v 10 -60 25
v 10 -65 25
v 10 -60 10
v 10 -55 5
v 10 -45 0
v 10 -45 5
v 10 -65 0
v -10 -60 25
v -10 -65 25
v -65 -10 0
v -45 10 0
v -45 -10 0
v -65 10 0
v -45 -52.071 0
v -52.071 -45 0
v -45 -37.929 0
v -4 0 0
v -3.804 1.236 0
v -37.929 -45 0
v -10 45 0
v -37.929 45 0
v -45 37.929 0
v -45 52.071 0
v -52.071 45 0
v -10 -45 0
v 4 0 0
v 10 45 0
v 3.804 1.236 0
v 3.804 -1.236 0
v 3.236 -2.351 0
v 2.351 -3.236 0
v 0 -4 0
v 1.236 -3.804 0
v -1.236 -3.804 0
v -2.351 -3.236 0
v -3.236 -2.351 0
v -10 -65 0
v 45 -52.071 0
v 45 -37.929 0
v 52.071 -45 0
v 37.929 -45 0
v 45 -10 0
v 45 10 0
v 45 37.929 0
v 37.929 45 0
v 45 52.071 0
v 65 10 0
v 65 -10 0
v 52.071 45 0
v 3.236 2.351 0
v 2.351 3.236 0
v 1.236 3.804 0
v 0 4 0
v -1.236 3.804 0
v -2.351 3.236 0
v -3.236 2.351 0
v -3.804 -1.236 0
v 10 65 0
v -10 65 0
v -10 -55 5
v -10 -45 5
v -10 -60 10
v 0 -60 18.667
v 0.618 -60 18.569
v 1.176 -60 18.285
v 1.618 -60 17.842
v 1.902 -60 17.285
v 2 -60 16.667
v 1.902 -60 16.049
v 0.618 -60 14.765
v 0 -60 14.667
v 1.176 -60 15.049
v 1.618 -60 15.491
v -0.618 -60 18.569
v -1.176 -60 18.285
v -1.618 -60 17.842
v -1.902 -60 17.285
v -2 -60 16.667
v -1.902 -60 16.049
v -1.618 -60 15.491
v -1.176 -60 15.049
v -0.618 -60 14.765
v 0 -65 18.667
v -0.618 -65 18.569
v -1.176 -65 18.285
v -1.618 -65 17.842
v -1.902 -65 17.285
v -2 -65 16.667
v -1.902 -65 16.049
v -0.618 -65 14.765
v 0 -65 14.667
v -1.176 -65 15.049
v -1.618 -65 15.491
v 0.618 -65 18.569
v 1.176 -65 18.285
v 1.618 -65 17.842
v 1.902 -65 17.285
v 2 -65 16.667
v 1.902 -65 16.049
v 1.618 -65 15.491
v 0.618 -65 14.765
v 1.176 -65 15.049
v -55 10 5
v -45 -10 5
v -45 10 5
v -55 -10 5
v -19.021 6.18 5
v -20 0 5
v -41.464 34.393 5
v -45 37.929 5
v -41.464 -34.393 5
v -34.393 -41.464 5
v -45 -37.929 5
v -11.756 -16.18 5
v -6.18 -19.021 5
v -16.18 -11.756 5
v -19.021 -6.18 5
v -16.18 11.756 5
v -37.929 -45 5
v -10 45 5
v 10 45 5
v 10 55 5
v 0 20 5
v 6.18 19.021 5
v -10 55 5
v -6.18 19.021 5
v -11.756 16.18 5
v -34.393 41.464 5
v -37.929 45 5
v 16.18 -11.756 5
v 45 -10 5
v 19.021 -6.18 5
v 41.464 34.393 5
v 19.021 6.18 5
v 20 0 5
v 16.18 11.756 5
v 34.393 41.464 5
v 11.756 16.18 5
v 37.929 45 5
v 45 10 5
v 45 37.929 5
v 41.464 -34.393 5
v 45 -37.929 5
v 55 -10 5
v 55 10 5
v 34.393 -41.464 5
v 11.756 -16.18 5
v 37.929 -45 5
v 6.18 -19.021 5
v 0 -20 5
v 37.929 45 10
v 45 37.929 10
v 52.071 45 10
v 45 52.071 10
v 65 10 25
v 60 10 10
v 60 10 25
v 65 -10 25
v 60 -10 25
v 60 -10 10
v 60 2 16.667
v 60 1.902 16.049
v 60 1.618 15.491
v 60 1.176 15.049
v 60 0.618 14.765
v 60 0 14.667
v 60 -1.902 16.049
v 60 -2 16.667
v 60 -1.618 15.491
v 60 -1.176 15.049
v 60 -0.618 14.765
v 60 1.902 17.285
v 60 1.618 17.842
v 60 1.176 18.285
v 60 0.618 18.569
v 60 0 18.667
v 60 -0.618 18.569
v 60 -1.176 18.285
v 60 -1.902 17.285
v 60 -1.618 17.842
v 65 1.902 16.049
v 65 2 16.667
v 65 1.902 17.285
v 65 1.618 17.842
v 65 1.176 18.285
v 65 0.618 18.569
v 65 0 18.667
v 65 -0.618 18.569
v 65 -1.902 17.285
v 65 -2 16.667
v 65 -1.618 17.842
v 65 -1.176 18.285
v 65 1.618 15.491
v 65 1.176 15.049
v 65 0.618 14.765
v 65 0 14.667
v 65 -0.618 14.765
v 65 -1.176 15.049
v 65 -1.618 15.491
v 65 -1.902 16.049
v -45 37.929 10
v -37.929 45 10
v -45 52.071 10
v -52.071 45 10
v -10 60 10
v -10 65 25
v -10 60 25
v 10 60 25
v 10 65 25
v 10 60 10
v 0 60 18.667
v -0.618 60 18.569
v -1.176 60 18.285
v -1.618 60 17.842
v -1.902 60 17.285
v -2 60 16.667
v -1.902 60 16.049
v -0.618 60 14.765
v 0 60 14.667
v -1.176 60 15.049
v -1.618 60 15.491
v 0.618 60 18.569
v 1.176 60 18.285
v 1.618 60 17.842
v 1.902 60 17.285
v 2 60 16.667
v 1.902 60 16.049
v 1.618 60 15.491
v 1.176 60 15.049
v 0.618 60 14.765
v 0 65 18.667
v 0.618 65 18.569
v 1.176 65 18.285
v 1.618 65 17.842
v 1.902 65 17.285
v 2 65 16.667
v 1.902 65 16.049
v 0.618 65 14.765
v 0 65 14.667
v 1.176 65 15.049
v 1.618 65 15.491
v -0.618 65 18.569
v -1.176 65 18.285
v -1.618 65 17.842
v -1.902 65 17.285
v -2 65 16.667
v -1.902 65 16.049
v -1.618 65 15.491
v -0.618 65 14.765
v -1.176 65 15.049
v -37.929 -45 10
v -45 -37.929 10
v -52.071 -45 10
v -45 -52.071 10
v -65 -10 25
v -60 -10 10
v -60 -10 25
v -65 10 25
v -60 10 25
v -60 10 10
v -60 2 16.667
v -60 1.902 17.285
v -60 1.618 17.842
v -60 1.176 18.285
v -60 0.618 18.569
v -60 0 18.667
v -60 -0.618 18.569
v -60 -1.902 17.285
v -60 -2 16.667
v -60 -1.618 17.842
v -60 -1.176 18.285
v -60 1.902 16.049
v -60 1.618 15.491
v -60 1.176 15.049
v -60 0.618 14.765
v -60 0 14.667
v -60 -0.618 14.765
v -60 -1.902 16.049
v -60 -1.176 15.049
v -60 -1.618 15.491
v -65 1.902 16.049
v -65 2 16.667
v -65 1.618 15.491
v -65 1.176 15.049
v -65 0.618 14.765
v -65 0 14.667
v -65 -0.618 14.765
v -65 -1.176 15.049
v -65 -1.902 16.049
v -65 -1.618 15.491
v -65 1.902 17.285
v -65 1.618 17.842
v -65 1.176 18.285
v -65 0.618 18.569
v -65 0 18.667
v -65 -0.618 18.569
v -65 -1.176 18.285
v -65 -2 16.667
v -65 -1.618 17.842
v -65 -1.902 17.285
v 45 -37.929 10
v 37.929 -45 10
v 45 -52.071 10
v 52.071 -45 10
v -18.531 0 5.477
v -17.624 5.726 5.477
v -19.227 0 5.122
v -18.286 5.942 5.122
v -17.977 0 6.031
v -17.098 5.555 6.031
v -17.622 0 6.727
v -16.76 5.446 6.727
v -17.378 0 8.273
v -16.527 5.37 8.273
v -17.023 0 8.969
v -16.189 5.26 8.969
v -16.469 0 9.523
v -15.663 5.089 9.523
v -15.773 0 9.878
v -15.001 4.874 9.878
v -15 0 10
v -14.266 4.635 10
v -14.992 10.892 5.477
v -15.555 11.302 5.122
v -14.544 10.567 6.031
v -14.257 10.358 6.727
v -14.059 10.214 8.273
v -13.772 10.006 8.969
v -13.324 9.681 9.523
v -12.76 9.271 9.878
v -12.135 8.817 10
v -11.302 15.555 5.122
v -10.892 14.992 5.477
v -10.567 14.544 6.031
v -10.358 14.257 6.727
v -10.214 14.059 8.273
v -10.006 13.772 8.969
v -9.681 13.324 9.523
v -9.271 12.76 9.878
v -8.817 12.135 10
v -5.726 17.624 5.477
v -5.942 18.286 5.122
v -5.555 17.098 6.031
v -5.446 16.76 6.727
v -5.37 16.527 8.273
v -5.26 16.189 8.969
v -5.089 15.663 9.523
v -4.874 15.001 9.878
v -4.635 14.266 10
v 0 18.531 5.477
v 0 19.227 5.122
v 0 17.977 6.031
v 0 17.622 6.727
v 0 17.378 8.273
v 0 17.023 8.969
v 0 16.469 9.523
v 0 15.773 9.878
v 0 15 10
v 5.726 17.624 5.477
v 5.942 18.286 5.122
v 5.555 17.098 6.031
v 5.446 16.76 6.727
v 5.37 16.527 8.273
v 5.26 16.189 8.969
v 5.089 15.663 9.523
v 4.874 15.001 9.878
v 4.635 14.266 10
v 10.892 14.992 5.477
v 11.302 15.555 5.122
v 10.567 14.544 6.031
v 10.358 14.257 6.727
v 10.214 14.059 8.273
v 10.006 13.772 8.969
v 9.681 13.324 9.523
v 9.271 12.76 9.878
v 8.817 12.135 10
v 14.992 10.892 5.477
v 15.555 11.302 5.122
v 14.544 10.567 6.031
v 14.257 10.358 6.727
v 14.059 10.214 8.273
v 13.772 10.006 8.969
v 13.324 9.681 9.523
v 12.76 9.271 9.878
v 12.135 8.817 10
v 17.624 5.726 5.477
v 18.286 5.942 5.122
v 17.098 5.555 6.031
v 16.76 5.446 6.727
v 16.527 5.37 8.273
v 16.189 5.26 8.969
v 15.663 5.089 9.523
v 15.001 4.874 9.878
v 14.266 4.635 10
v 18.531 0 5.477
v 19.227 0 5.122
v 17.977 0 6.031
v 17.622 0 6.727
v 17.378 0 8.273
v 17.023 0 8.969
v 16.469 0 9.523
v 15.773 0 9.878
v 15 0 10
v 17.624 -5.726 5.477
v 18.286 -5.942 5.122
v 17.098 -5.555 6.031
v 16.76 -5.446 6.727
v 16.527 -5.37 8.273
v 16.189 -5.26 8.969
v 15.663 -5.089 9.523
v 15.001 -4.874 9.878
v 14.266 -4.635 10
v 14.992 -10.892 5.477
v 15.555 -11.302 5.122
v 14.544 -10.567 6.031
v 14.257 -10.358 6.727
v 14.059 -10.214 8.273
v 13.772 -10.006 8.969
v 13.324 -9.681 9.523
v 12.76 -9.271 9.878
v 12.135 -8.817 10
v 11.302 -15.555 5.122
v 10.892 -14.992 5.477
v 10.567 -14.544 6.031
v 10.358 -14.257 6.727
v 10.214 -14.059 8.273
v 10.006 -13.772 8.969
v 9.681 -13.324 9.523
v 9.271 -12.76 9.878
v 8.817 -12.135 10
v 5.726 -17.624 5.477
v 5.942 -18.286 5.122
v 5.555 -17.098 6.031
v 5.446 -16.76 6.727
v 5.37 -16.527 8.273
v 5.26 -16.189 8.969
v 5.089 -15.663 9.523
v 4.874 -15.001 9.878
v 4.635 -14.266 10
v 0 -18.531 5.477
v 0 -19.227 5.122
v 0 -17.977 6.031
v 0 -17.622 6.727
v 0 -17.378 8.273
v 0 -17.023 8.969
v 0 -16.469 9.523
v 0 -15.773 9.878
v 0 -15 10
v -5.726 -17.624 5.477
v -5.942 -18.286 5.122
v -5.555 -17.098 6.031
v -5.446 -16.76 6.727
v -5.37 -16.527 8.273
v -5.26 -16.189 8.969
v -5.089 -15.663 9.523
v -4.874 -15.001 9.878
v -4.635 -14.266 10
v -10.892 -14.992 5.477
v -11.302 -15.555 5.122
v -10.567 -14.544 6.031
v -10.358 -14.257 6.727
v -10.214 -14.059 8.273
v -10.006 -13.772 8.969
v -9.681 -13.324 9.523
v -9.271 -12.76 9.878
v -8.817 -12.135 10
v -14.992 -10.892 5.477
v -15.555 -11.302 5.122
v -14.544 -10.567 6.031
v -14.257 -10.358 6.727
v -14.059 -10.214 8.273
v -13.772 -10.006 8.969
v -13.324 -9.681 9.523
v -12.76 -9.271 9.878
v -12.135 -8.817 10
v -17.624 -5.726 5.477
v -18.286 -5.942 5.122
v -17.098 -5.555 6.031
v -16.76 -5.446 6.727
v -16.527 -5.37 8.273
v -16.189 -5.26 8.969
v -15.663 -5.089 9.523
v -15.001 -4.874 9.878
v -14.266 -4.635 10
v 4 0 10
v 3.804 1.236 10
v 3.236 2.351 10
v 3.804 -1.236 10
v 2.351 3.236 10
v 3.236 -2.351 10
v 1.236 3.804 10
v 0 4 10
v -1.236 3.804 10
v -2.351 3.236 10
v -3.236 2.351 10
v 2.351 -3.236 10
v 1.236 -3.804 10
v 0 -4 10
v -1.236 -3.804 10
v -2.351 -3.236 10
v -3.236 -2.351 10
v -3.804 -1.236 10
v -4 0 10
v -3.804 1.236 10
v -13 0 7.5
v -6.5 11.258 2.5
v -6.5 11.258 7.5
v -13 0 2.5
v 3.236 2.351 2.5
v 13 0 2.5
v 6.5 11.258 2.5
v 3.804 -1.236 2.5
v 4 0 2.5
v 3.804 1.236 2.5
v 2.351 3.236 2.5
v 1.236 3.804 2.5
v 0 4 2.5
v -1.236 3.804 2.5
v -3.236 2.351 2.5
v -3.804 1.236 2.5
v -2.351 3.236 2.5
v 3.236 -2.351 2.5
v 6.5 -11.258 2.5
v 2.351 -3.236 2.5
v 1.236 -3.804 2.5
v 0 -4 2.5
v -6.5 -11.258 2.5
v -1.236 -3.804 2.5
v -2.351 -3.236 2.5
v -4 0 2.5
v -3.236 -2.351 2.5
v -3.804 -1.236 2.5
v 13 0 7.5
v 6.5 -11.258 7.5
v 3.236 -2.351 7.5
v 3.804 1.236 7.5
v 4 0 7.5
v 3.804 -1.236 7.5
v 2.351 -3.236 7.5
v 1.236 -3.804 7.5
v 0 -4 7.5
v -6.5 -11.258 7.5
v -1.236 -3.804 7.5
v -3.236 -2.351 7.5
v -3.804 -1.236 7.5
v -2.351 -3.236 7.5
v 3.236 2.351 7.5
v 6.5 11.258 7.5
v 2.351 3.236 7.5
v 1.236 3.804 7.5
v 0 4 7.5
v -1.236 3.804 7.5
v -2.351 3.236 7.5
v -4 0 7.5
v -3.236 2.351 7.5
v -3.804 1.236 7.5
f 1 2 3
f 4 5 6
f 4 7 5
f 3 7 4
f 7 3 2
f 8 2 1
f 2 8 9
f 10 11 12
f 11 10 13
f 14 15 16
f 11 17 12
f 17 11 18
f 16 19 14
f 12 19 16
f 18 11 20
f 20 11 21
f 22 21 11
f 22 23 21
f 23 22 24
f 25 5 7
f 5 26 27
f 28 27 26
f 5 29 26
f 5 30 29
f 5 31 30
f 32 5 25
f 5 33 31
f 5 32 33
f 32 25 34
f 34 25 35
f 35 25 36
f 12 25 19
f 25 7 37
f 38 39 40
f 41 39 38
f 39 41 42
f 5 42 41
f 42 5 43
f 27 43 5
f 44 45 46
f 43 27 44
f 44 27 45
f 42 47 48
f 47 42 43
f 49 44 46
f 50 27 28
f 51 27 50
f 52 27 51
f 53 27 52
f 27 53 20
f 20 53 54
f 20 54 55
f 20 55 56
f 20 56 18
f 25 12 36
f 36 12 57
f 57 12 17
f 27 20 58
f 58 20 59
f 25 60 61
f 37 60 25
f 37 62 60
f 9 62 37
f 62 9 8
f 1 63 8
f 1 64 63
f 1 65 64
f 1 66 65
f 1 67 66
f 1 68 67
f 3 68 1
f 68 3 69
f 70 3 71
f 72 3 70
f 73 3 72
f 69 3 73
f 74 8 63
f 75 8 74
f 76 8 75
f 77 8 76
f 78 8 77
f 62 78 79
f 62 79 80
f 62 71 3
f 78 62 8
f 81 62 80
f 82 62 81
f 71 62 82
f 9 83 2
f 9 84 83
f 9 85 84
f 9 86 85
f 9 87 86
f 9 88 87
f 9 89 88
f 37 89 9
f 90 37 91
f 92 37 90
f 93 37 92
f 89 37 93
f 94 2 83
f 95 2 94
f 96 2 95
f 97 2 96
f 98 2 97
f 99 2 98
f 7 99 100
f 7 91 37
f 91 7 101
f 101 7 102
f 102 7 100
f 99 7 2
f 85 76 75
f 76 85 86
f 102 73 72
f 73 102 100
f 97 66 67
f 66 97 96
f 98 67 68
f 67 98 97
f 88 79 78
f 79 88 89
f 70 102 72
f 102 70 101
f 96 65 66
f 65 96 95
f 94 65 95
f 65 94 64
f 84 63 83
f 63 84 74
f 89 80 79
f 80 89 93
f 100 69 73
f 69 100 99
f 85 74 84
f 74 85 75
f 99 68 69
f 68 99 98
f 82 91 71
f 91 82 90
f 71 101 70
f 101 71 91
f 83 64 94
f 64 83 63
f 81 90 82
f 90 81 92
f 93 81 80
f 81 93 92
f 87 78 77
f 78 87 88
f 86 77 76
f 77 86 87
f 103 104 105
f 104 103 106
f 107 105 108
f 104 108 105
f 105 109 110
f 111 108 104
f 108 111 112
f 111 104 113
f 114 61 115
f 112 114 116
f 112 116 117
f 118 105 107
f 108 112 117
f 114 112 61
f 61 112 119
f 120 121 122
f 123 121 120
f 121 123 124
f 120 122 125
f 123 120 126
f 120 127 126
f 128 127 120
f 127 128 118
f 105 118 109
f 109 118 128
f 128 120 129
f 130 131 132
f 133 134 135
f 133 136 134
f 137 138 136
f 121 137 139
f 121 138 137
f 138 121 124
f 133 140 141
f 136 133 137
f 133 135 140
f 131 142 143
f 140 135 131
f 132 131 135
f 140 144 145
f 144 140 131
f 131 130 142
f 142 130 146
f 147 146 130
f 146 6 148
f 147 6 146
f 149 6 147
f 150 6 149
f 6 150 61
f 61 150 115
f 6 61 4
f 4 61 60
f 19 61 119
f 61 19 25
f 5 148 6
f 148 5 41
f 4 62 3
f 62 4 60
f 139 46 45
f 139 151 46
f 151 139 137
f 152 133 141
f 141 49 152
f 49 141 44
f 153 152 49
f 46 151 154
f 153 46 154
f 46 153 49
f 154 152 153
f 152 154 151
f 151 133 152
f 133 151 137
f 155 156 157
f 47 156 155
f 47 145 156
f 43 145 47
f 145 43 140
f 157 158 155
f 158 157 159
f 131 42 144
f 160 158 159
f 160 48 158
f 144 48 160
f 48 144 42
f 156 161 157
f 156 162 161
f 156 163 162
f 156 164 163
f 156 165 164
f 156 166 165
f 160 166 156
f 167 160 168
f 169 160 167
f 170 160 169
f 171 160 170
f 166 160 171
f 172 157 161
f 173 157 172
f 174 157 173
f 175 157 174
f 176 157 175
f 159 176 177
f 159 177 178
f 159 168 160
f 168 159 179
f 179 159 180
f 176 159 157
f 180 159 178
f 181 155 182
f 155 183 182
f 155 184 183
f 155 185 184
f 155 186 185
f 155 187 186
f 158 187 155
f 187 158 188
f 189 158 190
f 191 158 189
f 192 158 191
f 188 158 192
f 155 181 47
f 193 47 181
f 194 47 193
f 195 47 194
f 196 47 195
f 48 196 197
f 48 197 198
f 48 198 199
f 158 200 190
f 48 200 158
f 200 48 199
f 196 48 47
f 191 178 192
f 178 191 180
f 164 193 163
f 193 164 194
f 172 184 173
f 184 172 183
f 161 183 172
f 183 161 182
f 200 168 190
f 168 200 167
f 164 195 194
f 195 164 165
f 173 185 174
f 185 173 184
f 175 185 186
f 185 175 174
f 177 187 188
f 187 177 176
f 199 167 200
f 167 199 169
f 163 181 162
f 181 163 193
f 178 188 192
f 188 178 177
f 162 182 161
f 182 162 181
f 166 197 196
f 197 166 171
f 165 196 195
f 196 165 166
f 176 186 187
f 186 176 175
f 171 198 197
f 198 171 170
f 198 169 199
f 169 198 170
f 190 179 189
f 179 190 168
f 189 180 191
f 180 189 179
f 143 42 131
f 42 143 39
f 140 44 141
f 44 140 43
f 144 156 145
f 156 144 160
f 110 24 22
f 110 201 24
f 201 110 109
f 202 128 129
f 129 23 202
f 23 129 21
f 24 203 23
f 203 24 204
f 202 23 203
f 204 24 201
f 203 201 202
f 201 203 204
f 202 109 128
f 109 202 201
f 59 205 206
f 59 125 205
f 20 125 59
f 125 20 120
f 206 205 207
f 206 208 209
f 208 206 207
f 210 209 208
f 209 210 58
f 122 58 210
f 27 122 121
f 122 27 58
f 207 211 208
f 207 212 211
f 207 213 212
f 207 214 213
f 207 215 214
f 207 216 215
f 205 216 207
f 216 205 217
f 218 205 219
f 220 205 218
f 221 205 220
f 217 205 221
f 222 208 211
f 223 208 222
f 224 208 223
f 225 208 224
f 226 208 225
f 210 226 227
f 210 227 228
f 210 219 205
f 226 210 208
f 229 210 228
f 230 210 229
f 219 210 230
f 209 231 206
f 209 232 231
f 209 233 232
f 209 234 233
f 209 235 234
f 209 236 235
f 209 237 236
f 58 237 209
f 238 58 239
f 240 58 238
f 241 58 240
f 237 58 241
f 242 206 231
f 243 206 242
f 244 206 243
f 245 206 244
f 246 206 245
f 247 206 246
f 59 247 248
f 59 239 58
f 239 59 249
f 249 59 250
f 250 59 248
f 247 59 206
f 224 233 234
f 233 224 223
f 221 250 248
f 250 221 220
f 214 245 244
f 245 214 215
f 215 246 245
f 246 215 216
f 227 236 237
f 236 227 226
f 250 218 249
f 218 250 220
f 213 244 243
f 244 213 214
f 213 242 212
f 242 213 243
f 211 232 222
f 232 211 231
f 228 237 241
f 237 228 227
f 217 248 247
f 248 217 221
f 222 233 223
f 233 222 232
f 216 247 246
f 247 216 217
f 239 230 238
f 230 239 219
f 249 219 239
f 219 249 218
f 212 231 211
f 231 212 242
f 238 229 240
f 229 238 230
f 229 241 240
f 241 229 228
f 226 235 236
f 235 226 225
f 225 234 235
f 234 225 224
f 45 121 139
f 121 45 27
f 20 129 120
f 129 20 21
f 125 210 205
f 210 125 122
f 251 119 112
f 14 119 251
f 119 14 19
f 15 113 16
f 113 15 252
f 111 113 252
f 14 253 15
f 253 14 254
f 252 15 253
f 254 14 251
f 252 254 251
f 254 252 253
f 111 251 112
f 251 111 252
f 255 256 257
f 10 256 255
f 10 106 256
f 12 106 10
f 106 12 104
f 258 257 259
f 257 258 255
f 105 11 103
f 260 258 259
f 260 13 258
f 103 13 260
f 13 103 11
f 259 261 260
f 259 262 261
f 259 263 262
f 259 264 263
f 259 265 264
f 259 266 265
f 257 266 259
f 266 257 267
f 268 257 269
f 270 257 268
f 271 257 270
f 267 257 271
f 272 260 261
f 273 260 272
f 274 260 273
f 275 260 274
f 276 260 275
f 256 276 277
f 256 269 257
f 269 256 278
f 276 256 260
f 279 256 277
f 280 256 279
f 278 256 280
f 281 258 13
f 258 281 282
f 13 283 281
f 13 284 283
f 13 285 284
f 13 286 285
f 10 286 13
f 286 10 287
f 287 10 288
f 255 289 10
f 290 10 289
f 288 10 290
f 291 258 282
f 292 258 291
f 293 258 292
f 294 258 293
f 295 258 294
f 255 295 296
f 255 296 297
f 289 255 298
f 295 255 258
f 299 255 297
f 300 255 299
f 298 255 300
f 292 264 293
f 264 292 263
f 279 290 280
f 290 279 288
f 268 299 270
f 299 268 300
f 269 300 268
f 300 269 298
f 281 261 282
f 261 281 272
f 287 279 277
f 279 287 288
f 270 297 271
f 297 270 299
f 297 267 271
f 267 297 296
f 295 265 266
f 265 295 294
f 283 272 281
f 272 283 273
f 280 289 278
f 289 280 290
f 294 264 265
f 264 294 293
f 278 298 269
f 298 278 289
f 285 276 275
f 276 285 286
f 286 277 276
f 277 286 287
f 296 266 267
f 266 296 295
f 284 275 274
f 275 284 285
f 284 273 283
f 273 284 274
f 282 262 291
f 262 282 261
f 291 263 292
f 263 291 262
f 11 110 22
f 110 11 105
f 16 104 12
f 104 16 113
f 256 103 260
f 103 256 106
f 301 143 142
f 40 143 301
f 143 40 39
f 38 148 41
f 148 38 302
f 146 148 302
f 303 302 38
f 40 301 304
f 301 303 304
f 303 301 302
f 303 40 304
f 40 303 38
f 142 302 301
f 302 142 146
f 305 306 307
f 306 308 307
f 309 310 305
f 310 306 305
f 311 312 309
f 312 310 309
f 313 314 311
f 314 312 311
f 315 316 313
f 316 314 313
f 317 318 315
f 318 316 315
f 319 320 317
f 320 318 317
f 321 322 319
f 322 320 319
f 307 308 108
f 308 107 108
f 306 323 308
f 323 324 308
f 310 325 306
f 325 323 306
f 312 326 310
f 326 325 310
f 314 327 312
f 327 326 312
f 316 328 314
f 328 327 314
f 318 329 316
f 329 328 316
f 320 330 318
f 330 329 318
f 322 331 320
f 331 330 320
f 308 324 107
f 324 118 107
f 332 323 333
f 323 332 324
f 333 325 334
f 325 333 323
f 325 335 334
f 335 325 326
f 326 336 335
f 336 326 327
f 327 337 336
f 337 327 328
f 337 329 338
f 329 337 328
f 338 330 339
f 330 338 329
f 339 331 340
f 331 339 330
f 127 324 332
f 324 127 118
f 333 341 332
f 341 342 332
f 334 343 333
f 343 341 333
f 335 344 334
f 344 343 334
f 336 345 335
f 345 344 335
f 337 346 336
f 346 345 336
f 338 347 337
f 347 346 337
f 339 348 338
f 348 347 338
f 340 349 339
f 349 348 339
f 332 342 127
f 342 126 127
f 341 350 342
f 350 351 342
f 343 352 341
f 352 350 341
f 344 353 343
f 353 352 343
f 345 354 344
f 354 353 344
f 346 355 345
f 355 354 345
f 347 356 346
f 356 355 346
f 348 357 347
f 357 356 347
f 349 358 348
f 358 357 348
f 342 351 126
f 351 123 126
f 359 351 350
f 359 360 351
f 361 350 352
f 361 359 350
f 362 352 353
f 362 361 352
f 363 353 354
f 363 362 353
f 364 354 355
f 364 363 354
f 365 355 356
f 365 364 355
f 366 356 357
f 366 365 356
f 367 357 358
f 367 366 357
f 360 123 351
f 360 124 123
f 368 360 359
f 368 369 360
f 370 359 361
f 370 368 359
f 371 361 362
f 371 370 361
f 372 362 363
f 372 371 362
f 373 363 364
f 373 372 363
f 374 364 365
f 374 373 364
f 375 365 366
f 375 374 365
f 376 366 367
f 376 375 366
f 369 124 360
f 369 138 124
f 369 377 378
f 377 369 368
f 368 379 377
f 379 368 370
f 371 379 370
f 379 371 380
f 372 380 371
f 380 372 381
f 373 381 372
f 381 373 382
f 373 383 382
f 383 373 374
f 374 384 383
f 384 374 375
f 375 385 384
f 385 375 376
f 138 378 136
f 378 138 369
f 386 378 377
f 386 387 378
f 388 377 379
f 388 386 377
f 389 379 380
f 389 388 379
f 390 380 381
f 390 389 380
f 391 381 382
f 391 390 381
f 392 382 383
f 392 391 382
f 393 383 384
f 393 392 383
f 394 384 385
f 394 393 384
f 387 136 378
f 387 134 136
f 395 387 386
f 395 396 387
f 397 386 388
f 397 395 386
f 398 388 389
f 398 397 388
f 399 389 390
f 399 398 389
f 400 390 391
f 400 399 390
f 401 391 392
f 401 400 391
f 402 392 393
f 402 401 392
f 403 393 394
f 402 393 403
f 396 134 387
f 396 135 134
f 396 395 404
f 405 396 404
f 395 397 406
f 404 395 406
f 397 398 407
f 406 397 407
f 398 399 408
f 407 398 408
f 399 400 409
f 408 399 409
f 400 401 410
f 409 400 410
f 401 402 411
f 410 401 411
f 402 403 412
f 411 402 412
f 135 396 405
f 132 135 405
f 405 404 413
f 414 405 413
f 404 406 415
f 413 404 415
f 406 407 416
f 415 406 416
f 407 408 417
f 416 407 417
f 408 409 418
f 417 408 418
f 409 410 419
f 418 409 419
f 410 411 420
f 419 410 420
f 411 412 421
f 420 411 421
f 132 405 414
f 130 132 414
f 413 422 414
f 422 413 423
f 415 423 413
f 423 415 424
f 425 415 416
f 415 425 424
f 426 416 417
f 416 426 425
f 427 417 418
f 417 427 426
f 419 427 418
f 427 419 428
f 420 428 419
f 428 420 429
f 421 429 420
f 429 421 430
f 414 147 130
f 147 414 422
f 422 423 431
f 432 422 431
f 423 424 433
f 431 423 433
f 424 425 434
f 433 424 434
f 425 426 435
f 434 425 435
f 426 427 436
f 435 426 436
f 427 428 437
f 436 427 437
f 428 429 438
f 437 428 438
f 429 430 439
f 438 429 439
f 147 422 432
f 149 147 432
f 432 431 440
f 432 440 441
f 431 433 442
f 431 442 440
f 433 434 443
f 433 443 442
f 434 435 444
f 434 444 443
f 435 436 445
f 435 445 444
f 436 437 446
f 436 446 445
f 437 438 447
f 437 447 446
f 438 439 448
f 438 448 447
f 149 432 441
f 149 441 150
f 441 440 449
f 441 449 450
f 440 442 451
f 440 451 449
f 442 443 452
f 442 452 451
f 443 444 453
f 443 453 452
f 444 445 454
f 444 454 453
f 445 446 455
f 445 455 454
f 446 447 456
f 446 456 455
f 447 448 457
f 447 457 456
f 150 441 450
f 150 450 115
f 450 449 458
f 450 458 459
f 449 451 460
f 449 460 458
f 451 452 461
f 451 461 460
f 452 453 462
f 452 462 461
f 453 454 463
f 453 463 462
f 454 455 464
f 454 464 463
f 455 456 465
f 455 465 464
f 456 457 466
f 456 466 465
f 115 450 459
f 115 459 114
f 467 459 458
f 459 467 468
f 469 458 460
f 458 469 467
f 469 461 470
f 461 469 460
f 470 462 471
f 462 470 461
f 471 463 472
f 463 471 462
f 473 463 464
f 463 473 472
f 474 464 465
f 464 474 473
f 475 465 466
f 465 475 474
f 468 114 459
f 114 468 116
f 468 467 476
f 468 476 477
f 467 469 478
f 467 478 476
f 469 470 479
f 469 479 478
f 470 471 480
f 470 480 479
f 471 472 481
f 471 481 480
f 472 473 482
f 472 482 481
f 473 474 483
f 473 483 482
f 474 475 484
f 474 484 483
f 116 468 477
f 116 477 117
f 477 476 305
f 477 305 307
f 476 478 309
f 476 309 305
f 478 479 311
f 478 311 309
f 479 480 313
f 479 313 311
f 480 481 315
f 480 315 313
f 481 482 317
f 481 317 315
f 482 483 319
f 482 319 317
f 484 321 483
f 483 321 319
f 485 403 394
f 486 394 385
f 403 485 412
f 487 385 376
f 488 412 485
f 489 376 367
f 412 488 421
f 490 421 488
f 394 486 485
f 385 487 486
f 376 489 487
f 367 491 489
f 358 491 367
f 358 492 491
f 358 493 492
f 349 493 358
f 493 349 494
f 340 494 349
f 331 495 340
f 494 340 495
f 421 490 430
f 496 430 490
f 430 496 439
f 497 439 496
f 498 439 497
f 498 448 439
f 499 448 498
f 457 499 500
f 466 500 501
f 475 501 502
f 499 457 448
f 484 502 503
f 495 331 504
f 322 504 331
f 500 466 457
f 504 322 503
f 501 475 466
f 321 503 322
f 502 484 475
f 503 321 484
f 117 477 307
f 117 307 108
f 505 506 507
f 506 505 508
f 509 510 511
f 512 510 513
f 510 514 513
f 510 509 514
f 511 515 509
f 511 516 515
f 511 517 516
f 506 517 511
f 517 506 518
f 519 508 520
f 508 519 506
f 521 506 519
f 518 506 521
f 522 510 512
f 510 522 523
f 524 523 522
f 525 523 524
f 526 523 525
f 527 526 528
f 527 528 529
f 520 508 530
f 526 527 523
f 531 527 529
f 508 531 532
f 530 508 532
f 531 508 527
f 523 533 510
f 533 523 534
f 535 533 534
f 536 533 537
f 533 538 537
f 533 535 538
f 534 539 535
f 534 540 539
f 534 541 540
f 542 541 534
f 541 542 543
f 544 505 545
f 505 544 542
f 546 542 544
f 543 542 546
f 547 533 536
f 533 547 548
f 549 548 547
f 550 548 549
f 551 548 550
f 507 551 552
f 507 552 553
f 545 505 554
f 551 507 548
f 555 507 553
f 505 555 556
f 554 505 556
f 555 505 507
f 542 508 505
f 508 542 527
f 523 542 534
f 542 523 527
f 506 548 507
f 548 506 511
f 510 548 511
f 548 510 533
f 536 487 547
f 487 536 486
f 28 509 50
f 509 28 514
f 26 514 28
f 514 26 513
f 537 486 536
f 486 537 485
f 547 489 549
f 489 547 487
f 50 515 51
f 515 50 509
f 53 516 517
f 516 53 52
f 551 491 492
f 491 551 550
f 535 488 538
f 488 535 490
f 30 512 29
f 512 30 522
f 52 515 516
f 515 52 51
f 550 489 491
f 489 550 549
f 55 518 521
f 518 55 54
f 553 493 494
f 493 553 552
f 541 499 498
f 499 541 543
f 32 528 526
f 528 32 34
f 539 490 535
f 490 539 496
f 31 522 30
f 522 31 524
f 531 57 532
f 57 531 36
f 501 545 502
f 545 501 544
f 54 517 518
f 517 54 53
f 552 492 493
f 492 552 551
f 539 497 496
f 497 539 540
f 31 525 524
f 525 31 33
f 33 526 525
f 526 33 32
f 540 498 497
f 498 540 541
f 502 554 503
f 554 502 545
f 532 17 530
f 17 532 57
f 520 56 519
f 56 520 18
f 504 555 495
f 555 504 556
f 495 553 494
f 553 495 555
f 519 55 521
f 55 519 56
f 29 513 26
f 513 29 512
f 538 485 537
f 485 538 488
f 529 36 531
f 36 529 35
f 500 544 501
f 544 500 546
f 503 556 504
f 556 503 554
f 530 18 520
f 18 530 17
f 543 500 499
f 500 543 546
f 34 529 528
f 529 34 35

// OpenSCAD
taille = 90;
tailleGuide = 10;
epaisseur = 5;
$fn = 20;

difference() {
	union() {
		translate([-taille / 2, -taille / 2,0]) cube([taille, taille, epaisseur]);
		for (i = [0 : 3]) {
			rotate(i * 90) {
				translate([taille / 2, taille / 2, 0]) {
					rotate(45) {
						guide(tailleGuide, 2 * tailleGuide, 2* epaisseur);
					}
				}
				translate([0, -taille / 2, 0]) {
					patteAccroche(20, 20, 25, epaisseur); // Largeur, Longueur, Hauteur, Epaisseur
				}
			}
		}
		translate([0, 0, epaisseur]) {
			renfort(20, epaisseur);
		}
	}
	translate([0, 0, epaisseur]) {
		ecrou(13, 5);
	}
}

module guide(largeur, longueur, epaisseur) {
	translate([largeur / 2, largeur / 2, 0]) rotate ([90, -90, 0]) linear_extrude(height = largeur, convexity = 10) 
	polygon([[0,0],[epaisseur,0],[epaisseur, longueur / 2],[0, longueur]]);
}

module ecrou(tailleEcrou, epaisseurEcrou) {
	union() {
		linear_extrude(height = epaisseurEcrou, center = true, convexity = 10, twist = 0)
		polygon(points =	[ [tailleEcrou, 0], [tailleEcrou * cos(60) , tailleEcrou * sin(60)], 
						[tailleEcrou * cos(120) , tailleEcrou * sin(120)], 
						[tailleEcrou * cos(180) , tailleEcrou * sin(180)], 
						[tailleEcrou * cos(240) , tailleEcrou * sin(240)], 
						[tailleEcrou * cos(300) , tailleEcrou * sin(300)]]);
		translate(v = [0, 0, -10]) {		
			cylinder(h=20, r=tailleEcrou * (4 / 13));
		}
	}
}

module patteAccroche(largeur, longueur , hauteur, epaisseur) {
	translate([-largeur / 2, - longueur, 0]) {
		union() {
			cube([largeur, longueur, epaisseur]);
			difference() {
				cube(size = [largeur, epaisseur, hauteur]);
				translate ([largeur / 2, 0, 2 * hauteur / 3]) 
				rotate ([90,0,0]) cylinder (h = 20, r = 2, center = true);
			}
			polyhedron(
				points =	[ [0,epaisseur,epaisseur], [0, 2 * epaisseur, epaisseur],
						[0, epaisseur, 2 * epaisseur], [largeur,epaisseur,epaisseur],
						[largeur, 2 * epaisseur, epaisseur], [largeur, epaisseur, 2 * epaisseur]  ],
				triangles = 	[ [0, 1, 2], [3, 5, 4], [0, 2, 3], [2, 5, 3], [1, 4, 5], [1, 5, 2] ,
						[1, 0, 4], [4, 0, 3] ]
			);
		}
	}
}

module renfort(diametre, epaisseur) {
	translate([0,0, epaisseur / 2]) {
		rotate_extrude(convexity = 10) {
			difference() {
				union() {
					translate([(diametre - epaisseur) / 2, 0, 0]) square([diametre - epaisseur, epaisseur], true);
					translate([(diametre - epaisseur) , 0, 0]) circle(epaisseur / 2);
					translate([(diametre - epaisseur), -epaisseur /2, 0]) square([epaisseur, epaisseur /2]);
				}
				translate([diametre, 0, 0]) circle(epaisseur / 2);
			}
		}
	}
}
